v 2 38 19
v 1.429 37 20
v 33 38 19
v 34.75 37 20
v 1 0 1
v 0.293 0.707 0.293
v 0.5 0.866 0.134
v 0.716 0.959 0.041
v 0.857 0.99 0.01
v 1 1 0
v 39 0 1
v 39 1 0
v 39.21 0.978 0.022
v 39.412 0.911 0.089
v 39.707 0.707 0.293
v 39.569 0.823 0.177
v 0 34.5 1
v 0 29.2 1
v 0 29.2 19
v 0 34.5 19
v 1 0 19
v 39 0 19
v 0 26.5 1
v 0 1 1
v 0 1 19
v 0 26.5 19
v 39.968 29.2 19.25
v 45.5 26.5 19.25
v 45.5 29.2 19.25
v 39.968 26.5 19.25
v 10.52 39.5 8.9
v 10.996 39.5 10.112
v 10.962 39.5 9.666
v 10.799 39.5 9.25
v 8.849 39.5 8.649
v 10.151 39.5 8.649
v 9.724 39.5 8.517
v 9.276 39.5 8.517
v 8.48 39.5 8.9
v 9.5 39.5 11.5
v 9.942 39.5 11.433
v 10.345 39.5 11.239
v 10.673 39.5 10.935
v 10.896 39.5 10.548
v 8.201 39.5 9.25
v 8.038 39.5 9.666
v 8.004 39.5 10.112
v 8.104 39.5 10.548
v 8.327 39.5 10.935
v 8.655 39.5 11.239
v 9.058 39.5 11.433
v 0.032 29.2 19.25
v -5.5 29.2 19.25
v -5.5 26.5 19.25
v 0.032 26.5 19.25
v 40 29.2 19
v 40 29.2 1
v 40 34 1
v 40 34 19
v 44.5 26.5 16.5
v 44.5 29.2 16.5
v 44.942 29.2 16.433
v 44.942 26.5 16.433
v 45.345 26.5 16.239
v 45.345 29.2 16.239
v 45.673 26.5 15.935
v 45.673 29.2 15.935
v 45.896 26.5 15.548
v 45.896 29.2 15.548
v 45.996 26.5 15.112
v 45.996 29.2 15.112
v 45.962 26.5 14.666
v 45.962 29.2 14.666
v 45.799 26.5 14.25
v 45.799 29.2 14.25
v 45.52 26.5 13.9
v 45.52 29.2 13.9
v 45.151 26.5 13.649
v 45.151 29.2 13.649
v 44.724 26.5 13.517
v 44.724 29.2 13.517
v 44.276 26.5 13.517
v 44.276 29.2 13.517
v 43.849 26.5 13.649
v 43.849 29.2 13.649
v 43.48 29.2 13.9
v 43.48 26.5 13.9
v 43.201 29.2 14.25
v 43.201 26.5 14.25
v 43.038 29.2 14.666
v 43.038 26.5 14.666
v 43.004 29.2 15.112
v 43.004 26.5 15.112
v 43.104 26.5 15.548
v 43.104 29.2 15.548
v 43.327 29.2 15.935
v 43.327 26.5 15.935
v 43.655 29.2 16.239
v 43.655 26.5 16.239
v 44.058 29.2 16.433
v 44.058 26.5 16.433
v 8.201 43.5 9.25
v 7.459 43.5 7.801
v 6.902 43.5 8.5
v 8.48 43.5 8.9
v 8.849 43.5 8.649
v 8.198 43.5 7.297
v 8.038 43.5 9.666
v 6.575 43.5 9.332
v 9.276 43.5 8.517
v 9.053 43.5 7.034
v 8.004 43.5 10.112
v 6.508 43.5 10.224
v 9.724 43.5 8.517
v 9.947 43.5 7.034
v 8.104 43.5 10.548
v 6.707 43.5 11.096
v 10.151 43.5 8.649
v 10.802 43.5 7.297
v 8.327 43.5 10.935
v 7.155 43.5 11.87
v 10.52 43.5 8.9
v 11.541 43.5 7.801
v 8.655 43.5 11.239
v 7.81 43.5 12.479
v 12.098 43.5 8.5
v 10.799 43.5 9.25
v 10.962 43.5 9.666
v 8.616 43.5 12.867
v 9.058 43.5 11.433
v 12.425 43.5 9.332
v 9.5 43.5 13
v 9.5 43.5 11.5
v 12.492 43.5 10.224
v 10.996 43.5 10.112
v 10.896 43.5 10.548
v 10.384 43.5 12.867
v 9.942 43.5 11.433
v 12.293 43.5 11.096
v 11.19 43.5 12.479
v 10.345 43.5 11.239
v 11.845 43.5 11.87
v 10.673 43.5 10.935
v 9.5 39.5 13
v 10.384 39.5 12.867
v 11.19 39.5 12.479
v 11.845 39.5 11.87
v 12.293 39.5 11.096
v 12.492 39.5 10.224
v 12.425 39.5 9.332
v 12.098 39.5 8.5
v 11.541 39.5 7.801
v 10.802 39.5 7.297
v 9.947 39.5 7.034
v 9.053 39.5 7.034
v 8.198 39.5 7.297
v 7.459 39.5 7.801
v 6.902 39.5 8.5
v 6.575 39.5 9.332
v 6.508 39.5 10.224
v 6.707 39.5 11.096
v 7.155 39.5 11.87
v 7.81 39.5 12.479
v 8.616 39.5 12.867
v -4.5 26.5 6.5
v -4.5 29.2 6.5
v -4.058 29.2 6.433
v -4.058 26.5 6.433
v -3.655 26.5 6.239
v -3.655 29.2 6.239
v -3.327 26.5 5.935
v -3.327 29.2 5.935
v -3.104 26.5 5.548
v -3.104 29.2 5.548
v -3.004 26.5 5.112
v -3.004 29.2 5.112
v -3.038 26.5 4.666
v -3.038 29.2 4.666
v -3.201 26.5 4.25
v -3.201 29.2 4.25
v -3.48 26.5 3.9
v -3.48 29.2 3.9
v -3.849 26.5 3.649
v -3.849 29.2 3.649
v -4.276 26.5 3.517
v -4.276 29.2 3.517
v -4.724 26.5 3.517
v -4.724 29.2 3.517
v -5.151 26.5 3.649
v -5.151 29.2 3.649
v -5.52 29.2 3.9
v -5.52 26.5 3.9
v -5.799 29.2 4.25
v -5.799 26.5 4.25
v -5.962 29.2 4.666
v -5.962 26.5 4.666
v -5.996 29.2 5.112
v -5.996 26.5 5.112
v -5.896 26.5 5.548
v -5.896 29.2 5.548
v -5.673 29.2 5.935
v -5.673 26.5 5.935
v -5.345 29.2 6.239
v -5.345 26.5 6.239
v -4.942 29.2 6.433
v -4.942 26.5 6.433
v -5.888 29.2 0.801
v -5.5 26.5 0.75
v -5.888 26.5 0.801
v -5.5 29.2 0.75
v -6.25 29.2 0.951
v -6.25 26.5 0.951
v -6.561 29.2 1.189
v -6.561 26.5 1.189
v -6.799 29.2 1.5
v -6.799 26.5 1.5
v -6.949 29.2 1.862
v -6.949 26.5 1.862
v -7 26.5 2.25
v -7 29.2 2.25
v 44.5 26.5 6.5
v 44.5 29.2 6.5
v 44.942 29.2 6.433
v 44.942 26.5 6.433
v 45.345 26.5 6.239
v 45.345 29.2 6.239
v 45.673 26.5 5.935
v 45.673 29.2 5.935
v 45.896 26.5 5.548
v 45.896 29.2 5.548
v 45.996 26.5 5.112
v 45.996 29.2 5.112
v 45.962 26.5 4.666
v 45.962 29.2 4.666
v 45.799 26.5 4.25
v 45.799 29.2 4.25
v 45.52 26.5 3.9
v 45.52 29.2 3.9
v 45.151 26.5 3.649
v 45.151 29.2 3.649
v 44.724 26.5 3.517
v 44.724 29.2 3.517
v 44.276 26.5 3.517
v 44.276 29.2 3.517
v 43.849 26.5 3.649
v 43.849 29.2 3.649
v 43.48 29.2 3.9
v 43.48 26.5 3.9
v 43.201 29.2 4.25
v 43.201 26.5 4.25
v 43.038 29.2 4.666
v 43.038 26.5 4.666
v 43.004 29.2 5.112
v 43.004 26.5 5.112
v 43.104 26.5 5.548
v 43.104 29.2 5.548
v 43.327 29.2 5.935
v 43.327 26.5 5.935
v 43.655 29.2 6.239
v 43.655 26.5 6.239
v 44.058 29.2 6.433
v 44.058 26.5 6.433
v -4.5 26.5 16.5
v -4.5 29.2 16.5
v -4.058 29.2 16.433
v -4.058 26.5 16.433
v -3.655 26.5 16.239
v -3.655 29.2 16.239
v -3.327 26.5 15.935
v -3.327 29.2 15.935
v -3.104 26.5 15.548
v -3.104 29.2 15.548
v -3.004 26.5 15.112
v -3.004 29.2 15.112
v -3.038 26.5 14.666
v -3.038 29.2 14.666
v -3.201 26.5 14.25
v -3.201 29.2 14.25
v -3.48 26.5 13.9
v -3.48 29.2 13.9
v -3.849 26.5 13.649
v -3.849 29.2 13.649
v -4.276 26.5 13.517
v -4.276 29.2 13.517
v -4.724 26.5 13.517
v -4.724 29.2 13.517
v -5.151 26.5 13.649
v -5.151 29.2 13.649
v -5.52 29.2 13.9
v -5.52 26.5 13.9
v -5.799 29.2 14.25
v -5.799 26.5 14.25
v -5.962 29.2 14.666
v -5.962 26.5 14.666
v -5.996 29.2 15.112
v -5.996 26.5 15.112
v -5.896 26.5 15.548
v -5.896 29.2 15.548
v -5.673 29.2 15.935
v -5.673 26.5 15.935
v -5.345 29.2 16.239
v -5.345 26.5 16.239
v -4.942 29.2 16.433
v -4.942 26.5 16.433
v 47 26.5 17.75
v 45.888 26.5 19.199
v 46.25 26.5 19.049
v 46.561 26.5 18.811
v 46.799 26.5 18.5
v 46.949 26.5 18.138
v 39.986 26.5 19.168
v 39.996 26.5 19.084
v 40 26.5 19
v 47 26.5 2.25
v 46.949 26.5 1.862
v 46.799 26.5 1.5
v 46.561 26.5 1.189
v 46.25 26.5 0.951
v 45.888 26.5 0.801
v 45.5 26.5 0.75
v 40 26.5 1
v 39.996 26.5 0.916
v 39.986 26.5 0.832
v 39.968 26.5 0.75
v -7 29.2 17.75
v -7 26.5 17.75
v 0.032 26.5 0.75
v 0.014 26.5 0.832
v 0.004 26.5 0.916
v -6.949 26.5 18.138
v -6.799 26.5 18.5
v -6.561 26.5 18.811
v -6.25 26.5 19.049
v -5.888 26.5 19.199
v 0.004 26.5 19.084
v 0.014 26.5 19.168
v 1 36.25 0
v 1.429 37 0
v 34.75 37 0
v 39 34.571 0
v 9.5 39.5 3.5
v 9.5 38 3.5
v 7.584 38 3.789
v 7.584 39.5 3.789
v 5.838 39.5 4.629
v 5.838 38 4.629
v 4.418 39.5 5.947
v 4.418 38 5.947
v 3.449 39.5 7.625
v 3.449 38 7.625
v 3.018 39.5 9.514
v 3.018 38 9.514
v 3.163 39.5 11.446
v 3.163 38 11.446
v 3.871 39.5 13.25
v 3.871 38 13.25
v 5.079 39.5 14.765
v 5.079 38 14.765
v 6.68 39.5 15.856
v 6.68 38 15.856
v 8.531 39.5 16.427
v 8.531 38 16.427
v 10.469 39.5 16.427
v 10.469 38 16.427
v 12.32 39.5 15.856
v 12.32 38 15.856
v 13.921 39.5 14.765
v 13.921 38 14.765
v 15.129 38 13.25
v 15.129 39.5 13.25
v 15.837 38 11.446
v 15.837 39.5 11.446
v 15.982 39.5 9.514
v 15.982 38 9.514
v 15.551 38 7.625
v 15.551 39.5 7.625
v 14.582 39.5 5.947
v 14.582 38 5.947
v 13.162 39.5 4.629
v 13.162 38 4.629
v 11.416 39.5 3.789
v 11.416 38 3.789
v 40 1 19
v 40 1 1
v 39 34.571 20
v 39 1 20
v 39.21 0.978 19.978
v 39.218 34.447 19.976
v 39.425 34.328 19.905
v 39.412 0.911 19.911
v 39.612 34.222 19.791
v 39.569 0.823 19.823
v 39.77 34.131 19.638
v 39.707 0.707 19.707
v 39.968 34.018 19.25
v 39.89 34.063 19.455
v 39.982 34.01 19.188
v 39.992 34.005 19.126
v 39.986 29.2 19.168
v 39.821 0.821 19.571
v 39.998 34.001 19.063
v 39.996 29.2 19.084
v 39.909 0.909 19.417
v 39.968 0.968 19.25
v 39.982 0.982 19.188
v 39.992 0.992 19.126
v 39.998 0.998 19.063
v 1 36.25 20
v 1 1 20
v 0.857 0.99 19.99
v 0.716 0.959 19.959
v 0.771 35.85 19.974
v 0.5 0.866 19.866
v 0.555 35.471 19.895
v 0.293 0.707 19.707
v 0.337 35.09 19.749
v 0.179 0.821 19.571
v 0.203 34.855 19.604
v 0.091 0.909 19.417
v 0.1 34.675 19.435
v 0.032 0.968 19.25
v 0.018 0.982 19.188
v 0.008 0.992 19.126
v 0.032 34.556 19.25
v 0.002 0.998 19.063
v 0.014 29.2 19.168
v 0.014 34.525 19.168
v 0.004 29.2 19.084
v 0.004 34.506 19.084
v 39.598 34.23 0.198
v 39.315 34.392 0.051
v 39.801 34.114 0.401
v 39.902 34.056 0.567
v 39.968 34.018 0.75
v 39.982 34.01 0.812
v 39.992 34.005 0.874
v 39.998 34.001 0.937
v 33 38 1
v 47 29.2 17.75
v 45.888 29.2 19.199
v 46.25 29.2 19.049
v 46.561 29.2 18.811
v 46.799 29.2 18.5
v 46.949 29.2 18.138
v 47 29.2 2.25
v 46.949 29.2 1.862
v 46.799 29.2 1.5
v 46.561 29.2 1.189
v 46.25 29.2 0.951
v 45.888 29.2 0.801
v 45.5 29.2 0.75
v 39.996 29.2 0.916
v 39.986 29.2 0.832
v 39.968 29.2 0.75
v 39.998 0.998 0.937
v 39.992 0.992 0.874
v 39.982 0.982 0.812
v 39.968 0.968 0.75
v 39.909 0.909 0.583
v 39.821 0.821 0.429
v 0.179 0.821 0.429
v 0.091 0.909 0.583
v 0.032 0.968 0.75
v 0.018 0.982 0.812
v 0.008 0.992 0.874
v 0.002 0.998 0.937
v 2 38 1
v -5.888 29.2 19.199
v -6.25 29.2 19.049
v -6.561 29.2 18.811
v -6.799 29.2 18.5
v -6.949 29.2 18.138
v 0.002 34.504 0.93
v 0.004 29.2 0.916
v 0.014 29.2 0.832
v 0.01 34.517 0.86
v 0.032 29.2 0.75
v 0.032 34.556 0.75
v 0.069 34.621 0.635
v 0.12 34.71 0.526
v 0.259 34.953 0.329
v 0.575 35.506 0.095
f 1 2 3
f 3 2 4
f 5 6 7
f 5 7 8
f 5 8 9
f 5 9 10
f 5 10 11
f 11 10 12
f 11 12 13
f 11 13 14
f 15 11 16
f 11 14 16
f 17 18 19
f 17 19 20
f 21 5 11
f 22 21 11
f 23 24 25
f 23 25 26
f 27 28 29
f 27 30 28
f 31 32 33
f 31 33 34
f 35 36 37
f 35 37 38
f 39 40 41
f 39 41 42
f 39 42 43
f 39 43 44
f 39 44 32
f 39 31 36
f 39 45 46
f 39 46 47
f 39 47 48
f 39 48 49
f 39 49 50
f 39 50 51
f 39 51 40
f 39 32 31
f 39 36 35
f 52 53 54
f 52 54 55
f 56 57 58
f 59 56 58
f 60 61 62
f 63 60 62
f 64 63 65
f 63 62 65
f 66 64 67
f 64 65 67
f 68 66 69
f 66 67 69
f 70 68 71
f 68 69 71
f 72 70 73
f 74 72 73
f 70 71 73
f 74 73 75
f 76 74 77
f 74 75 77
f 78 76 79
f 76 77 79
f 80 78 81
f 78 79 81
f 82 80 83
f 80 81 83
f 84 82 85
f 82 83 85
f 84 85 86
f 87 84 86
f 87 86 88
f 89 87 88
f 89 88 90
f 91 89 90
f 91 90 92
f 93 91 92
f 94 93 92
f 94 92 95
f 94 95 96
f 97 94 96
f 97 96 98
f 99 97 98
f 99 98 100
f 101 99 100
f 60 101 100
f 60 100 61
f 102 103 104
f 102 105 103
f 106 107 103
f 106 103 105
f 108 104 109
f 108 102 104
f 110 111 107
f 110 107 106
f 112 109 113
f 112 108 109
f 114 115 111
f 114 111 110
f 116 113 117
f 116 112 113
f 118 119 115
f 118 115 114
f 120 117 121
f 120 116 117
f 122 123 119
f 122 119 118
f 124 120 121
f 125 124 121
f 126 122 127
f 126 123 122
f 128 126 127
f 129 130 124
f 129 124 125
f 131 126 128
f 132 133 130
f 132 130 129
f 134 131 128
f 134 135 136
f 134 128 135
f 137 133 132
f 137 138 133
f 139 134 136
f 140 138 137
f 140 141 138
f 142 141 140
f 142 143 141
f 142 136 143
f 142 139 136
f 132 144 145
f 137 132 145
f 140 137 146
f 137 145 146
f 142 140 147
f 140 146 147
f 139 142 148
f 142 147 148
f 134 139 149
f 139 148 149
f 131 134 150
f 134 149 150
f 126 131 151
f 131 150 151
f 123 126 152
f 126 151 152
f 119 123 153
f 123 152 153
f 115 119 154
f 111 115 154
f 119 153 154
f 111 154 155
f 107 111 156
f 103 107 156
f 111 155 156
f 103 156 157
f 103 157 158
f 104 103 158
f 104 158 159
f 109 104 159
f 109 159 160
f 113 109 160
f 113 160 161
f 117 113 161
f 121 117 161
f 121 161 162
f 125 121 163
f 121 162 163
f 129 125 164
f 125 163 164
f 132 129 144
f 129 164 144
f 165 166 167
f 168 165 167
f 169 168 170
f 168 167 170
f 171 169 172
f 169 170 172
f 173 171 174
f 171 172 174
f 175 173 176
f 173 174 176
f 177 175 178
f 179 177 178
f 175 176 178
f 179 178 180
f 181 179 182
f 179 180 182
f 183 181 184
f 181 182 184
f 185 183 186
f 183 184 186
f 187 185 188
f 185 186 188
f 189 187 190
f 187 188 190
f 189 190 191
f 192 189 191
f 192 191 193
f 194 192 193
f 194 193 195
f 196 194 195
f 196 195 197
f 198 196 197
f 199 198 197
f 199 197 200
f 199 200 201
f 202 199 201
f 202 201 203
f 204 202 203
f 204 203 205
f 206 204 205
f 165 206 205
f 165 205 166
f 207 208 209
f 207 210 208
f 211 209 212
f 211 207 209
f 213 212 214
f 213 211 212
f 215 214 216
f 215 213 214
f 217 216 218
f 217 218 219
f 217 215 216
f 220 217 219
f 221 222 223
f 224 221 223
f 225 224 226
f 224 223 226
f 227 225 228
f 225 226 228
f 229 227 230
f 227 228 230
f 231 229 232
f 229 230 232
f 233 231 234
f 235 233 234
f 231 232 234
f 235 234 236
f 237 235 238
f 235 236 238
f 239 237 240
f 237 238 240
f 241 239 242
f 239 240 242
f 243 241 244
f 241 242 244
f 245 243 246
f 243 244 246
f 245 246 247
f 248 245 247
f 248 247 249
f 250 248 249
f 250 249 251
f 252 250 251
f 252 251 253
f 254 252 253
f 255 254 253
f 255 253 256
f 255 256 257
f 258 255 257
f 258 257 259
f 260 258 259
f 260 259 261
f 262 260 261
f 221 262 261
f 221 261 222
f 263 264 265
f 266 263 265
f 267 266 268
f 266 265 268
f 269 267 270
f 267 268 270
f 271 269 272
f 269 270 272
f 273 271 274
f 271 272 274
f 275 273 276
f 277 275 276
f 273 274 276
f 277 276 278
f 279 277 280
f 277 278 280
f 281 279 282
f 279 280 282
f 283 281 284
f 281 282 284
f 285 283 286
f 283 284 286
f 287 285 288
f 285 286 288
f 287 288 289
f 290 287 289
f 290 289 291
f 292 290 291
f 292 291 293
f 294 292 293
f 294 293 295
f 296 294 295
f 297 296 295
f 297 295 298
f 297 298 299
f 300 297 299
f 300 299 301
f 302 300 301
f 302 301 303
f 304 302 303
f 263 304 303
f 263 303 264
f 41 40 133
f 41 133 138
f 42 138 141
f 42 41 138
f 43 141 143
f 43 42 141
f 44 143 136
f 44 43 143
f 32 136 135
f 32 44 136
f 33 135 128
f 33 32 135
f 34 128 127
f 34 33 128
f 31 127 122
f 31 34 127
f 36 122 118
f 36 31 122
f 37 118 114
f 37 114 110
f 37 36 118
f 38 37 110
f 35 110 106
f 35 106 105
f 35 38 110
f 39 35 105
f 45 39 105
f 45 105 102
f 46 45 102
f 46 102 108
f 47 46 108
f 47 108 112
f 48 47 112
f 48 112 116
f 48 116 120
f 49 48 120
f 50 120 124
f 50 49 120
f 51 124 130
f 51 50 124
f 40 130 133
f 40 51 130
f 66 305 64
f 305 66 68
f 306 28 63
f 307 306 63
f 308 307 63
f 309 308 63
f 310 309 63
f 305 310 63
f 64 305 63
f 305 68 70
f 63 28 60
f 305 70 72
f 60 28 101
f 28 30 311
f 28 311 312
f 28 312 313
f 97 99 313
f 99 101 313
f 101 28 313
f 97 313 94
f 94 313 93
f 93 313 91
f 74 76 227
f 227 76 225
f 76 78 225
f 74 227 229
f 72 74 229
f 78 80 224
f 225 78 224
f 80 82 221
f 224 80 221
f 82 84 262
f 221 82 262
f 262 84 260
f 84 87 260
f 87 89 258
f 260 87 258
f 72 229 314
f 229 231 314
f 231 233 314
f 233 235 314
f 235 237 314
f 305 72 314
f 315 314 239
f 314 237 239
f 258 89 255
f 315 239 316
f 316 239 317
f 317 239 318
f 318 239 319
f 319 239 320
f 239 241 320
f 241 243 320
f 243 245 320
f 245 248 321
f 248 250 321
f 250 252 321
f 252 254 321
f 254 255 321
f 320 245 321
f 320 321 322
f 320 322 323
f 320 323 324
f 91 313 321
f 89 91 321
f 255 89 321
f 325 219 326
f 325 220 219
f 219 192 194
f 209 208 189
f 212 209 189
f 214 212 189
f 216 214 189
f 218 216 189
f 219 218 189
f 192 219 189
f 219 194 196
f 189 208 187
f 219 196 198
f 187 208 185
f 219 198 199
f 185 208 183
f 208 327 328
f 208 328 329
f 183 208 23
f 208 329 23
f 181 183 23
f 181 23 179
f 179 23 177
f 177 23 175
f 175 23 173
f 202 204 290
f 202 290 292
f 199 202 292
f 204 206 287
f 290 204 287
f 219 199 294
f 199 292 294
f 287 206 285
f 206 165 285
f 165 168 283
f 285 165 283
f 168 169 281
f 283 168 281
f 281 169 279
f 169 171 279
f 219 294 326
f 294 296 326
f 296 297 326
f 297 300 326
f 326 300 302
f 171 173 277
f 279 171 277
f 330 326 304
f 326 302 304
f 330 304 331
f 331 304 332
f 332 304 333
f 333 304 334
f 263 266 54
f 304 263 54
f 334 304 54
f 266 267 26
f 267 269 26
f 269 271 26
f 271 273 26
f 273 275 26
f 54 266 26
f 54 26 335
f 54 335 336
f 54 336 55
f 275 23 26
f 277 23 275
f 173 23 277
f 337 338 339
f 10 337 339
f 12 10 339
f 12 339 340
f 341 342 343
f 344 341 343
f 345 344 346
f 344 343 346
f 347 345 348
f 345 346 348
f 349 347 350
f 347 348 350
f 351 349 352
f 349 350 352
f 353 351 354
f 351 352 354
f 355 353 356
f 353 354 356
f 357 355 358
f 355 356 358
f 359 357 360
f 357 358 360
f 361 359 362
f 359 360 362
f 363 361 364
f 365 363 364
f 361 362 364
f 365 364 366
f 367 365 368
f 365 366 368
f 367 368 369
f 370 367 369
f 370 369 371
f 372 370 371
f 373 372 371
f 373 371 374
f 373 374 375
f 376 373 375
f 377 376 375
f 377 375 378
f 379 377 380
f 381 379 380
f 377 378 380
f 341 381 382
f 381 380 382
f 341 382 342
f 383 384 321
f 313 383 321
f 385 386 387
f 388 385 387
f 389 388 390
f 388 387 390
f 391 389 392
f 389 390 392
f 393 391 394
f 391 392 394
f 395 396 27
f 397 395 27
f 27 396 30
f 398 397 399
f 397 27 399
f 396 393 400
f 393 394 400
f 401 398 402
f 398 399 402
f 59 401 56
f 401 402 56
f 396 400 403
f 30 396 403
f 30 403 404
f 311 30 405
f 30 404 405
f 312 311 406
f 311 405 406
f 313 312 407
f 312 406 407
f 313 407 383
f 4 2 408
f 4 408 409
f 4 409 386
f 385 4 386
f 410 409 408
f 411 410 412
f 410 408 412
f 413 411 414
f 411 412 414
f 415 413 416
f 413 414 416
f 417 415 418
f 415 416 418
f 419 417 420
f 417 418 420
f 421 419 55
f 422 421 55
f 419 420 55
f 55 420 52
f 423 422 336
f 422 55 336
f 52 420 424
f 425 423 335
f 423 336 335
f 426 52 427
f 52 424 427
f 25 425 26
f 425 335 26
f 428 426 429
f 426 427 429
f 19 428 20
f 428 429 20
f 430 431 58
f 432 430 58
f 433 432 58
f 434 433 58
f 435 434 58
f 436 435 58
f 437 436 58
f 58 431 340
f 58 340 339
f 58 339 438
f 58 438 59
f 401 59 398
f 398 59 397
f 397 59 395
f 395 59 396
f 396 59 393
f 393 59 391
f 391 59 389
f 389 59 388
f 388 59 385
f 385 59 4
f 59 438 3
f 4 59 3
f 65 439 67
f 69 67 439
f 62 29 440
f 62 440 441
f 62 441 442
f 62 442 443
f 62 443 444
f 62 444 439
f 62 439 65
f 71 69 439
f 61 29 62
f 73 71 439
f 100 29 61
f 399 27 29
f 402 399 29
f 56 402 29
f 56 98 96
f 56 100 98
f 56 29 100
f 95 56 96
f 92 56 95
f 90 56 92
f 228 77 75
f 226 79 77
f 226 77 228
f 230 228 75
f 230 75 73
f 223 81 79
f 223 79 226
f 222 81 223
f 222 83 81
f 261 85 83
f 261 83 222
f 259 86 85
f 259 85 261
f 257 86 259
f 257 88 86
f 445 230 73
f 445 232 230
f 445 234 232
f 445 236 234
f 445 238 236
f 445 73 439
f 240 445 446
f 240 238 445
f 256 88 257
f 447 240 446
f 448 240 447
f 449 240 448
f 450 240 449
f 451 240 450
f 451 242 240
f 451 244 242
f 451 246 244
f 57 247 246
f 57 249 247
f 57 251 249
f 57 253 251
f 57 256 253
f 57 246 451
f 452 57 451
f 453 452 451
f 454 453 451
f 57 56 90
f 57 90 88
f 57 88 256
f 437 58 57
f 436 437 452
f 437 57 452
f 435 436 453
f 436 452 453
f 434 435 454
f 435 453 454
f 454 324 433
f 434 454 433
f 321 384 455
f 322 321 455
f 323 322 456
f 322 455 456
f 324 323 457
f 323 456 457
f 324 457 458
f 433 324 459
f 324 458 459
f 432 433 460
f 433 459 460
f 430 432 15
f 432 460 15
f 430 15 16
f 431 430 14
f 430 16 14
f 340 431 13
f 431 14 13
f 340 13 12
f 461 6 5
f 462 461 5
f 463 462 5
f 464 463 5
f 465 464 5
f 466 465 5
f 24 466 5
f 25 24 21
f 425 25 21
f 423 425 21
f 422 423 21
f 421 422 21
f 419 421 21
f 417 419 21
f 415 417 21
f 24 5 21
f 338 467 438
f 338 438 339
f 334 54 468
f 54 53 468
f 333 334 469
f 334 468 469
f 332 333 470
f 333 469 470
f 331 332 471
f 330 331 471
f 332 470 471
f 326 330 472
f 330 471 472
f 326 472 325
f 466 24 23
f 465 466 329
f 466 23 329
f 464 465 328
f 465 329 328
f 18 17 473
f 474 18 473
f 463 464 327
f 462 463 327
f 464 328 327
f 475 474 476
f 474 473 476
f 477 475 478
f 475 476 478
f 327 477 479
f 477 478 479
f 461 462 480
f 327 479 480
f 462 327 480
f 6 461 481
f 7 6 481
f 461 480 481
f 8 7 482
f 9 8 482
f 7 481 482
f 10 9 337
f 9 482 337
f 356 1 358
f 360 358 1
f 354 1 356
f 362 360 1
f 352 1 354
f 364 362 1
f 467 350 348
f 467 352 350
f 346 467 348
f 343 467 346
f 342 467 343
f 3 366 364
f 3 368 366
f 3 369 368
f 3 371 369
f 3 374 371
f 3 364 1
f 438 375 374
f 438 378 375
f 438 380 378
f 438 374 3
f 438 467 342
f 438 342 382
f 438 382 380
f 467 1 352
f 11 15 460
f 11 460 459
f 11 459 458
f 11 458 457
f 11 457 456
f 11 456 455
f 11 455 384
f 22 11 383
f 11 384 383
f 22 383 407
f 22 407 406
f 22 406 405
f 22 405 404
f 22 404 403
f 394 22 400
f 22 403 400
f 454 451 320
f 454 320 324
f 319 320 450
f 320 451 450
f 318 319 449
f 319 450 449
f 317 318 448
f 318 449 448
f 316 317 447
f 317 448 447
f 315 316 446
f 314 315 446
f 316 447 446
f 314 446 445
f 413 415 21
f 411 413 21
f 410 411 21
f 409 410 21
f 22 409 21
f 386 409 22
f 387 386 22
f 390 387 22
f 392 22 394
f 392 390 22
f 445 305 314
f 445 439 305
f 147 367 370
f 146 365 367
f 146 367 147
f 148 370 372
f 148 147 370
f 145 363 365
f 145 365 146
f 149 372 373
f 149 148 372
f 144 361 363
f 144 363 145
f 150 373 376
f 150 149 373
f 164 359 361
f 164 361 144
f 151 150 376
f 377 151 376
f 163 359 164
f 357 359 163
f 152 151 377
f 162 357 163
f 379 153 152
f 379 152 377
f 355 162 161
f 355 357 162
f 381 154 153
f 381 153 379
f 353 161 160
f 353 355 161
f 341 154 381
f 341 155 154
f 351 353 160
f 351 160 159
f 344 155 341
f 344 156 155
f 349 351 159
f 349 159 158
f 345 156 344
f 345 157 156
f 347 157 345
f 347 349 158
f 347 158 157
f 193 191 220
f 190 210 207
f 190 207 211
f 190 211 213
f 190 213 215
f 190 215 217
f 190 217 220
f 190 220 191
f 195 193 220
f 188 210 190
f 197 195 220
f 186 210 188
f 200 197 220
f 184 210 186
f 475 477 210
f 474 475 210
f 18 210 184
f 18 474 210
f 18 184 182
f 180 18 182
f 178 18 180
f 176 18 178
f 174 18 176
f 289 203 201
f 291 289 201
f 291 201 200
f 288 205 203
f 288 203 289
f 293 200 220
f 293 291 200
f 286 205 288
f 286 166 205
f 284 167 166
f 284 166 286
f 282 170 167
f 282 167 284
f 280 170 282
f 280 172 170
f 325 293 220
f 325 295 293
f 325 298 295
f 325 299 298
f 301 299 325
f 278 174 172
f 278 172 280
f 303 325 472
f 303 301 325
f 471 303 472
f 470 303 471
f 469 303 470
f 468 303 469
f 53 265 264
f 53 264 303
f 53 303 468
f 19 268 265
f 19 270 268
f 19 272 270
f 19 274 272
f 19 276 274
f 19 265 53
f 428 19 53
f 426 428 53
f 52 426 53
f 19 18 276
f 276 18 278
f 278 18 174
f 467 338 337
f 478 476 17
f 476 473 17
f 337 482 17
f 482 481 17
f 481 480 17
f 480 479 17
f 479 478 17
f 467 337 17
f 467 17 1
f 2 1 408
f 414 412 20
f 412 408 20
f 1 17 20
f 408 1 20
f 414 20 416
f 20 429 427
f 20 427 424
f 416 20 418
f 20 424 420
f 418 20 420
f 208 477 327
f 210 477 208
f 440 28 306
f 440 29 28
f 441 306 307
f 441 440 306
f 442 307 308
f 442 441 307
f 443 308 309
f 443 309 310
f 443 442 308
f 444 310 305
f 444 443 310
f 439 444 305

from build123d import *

# Parameters (mm, degrees)
SKETCH_1_W          = 40
SKETCH_1_H          = 38
EXTRUDE_1_DEPTH     = 20
SKETCH_2_W          = 18.5
SKETCH_2_H          = 2.7
EXTRUDE_2_DEPTH     = 7
SKETCH_3_W          = 18.5
SKETCH_3_H          = 2.7
EXTRUDE_3_DEPTH     = 7
SKETCH_4_R          = 1.5
CUT_EXTRUDE_1_DEPTH = 7
CHAMFER_1_SIZE      = 1
CHAMFER_2_SIZE      = 2
CHAMFER_2_SIZE2     = 3.5
CHAMFER_3_SIZE      = 4
CHAMFER_3_SIZE2     = 7
CHAMFER_4_SIZE      = 1
SKETCH_5_R          = 6.5
EXTRUDE_4_DEPTH     = 1.5
SKETCH_6_R          = 3
SKETCH_6_R_2        = 1.5
EXTRUDE_5_DEPTH     = 4
FILLET_1_R          = 1.5
FILLET_2_R          = 1


with BuildPart() as part:
    # 草图1 → 凸台-拉伸1 (new body)
    with BuildSketch(Plane.XY):
        with Locations((20, 19)):
            Rectangle(SKETCH_1_W, SKETCH_1_H)
    extrude(amount=EXTRUDE_1_DEPTH)

    # 草图2 → 凸台-拉伸2 (add)
    with BuildSketch(Plane.ZY):
        with Locations((10, 27.85)):
            Rectangle(SKETCH_2_W, SKETCH_2_H)
    extrude(amount=EXTRUDE_2_DEPTH)

    # 草图3 → 凸台-拉伸3 (add)
    with BuildSketch(Plane(origin=(40, 0, 0), x_dir=(0, 0, -1), z_dir=(1, 0, 0))):
        with Locations((-10, 27.85)):
            Rectangle(SKETCH_3_W, SKETCH_3_H)
    extrude(amount=EXTRUDE_3_DEPTH)

    # 草图4 → 切除-拉伸1 (cut)
    with BuildSketch(Plane(origin=(0, 29.2, 0), x_dir=(1, 0, 0), z_dir=(0, 1, 0))):
        with Locations(Location((-4.5, -5, 0), (0, 0, 270))):
            Circle(SKETCH_4_R)
        with Locations(Location((44.5, -5, 0), (0, 0, 270))):
            Circle(SKETCH_4_R)
        with Locations(Location((-4.5, -15, 0), (0, 0, 270))):
            Circle(SKETCH_4_R)
        with Locations(Location((44.5, -15, 0), (0, 0, 270))):
            Circle(SKETCH_4_R)
    extrude(amount=-CUT_EXTRUDE_1_DEPTH, mode=Mode.SUBTRACT)

    # 倒角1
    chamfer_1_edges = [part.edges().sort_by_distance(p)[0] for p in [
        (20, 0, 0),
        (40, 0, 10),
        (0, 0, 10),
        (20, 0, 20),
    ]]
    chamfer(chamfer_1_edges, length=CHAMFER_1_SIZE)

    # 倒角2
    chamfer_2_edges = [part.edges().sort_by_distance(p)[0] for p in [
        (0, 38, 10),
    ]]
    chamfer_2_side = [part.faces().sort_by_distance(p)[0] for p in [
        (20, 38, 10),
    ]]
    chamfer(chamfer_2_edges, length=CHAMFER_2_SIZE, length2=CHAMFER_2_SIZE2, reference=chamfer_2_side[0])

    # 倒角3
    chamfer_3_edges = [part.edges().sort_by_distance(p)[0] for p in [
        (40, 38, 10),
    ]]
    chamfer_3_side = [part.faces().sort_by_distance(p)[0] for p in [
        (40, 18.895576408, 10),
    ]]
    chamfer(chamfer_3_edges, length=CHAMFER_3_SIZE, length2=CHAMFER_3_SIZE2, reference=chamfer_3_side[0])

    # 倒角4
    chamfer_4_edges = [part.edges().sort_by_distance(p)[0] for p in [
        (17.5, 38, 0),
        (17.5, 38, 20),
    ]]
    chamfer(chamfer_4_edges, length=CHAMFER_4_SIZE)

    # 草图5 → 凸台-拉伸4 (add)
    with BuildSketch(Plane(origin=(0, 38, 0), x_dir=(1, 0, 0), z_dir=(0, 1, 0))):
        with Locations(Location((9.5, -10, 0), (0, 0, 90))):
            Circle(SKETCH_5_R)
    extrude(amount=EXTRUDE_4_DEPTH)

    # 草图6 → 凸台-拉伸5 (add)
    with BuildSketch(Plane(origin=(0, 39.5, 0), x_dir=(1, 0, 0), z_dir=(0, 1, 0))):
        with Locations(Location((9.5, -10, 0), (0, 0, 270))):
            Circle(SKETCH_6_R)
        with Locations(Location((9.5, -10, 0), (0, 0, 270))):
            Circle(SKETCH_6_R_2, mode=Mode.SUBTRACT)
    extrude(amount=EXTRUDE_5_DEPTH)

    # 圆角1
    fillet_1_edges = [part.edges().sort_by_distance(p)[0] for p in [
        (-7, 27.85, 0.75),
        (-7, 27.85, 19.25),
        (47, 27.85, 19.25),
        (47, 27.85, 0.75),
    ]]
    fillet(fillet_1_edges, radius=FILLET_1_R)

    # 圆角2
    # the kernel refuses this fillet: 1 mm, written as the material it takes off along each edge
    with BuildSketch(Plane(origin=(0, 37, 20), x_dir=(1, 0, 0), z_dir=(0, -1, 0))) as fillet_2_piece_1_section:
        with BuildLine():
            CenterArc((FILLET_2_R, -FILLET_2_R), FILLET_2_R, 90, 90)
            Line((0, -FILLET_2_R), (0, 0))
            Line((0, 0), (FILLET_2_R, 0))
        make_face()
    fillet_2_piece_1 = extrude(amount=38.5, mode=Mode.PRIVATE)
    fillet_2_piece_1 = split(fillet_2_piece_1, bisect_by=Plane(origin=(0.233478453, 29.2, 19.792941909), z_dir=(0, 1, 0)), keep=Keep.TOP, mode=Mode.PRIVATE)
    fillet_2_piece_1 = split(fillet_2_piece_1, bisect_by=Plane(origin=(0.233478453, 33.1, 19.25), z_dir=(0, 0, 1)), keep=Keep.TOP, mode=Mode.PRIVATE)
    add(fillet_2_piece_1, mode=Mode.SUBTRACT)
    with BuildSketch(Plane(origin=(0, 37, 20), x_dir=(1, 0, 0), z_dir=(0, -1, 0))) as fillet_2_piece_2_section:
        with BuildLine():
            CenterArc((FILLET_2_R, -FILLET_2_R), FILLET_2_R, 90, 90)
            Line((0, -FILLET_2_R), (0, 0))
            Line((0, 0), (FILLET_2_R, 0))
        make_face()
    fillet_2_piece_2 = extrude(amount=38.5, mode=Mode.PRIVATE)
    fillet_2_piece_2 = split(fillet_2_piece_2, bisect_by=Plane(origin=(-0.003280029, 29.2, 19.146607635), z_dir=(0, 1, 0)), keep=Keep.TOP, mode=Mode.PRIVATE)
    fillet_2_piece_2 = split(fillet_2_piece_2, bisect_by=Plane(origin=(-0.003280029, 33.1, 19.25), z_dir=(0, 0, -1)), keep=Keep.TOP, mode=Mode.PRIVATE)
    add(fillet_2_piece_2, mode=Mode.SUBTRACT)
    with BuildSketch(Plane(origin=(0, 37, 20), x_dir=(1, 0, 0), z_dir=(0, -1, 0))) as fillet_2_piece_3_section:
        with BuildLine():
            CenterArc((FILLET_2_R, -FILLET_2_R), FILLET_2_R, 90, 90)
            Line((0, -FILLET_2_R), (0, 0))
            Line((0, 0), (FILLET_2_R, 0))
        make_face()
    fillet_2_piece_3 = extrude(amount=38.5, mode=Mode.PRIVATE)
    fillet_2_piece_3 = split(fillet_2_piece_3, bisect_by=Plane(origin=(0.233478453, 29.2, 19.792941909), z_dir=(0, -1, 0)), keep=Keep.TOP, mode=Mode.PRIVATE)
    fillet_2_piece_3 = split(fillet_2_piece_3, bisect_by=Plane(origin=(0.233478453, 27.85, 19.25), z_dir=(0, 0, 1)), keep=Keep.TOP, mode=Mode.PRIVATE)
    fillet_2_piece_3 = split(fillet_2_piece_3, bisect_by=Plane(origin=(0.233478453, 26.5, 19.792941909), z_dir=(0, 1, 0)), keep=Keep.TOP, mode=Mode.PRIVATE)
    add(fillet_2_piece_3, mode=Mode.SUBTRACT)
    with BuildSketch(Plane(origin=(0, 37, 20), x_dir=(1, 0, 0), z_dir=(0, -1, 0))) as fillet_2_piece_4_section:
        with BuildLine():
            CenterArc((FILLET_2_R, -FILLET_2_R), FILLET_2_R, 90, 90)
            Line((0, -FILLET_2_R), (0, 0))
            Line((0, 0), (FILLET_2_R, 0))
        make_face()
    fillet_2_piece_4 = extrude(amount=38.5, mode=Mode.PRIVATE)
    fillet_2_piece_4 = split(fillet_2_piece_4, bisect_by=Plane(origin=(0.233478453, 12.5, 19.25), z_dir=(0, 0, 1)), keep=Keep.TOP, mode=Mode.PRIVATE)
    fillet_2_piece_4 = split(fillet_2_piece_4, bisect_by=Plane(origin=(0.233478453, 26.5, 19.792941909), z_dir=(0, -1, 0)), keep=Keep.TOP, mode=Mode.PRIVATE)
    add(fillet_2_piece_4, mode=Mode.SUBTRACT)
    with BuildSketch(Plane(origin=(0, 37, 20), x_dir=(1, 0, 0), z_dir=(0, -1, 0))) as fillet_2_piece_5_section:
        with BuildLine():
            CenterArc((FILLET_2_R, -FILLET_2_R), FILLET_2_R, 90, 90)
            Line((0, -FILLET_2_R), (0, 0))
            Line((0, 0), (FILLET_2_R, 0))
        make_face()
    fillet_2_piece_5 = extrude(amount=38.5, mode=Mode.PRIVATE)
    fillet_2_piece_5 = split(fillet_2_piece_5, bisect_by=Plane(origin=(-0.003280029, 12.5, 19.25), z_dir=(0, 0, -1)), keep=Keep.TOP, mode=Mode.PRIVATE)
    fillet_2_piece_5 = split(fillet_2_piece_5, bisect_by=Plane(origin=(-0.003280029, 26.5, 19.146607635), z_dir=(0, -1, 0)), keep=Keep.TOP, mode=Mode.PRIVATE)
    add(fillet_2_piece_5, mode=Mode.SUBTRACT)
    with BuildSketch(Plane(origin=(0, 37, 0), x_dir=(1, 0, 0), z_dir=(0, -1, 0))) as fillet_2_piece_6_section:
        with BuildLine():
            CenterArc((FILLET_2_R, FILLET_2_R), FILLET_2_R, 180, 90)
            Line((0, FILLET_2_R), (0, 0))
            Line((0, 0), (FILLET_2_R, 0))
        make_face()
    fillet_2_piece_6 = extrude(amount=38.5, mode=Mode.PRIVATE)
    fillet_2_piece_6 = split(fillet_2_piece_6, bisect_by=Plane(origin=(0.233478453, 29.2, 0.207058091), z_dir=(0, 1, 0)), keep=Keep.TOP, mode=Mode.PRIVATE)
    fillet_2_piece_6 = split(fillet_2_piece_6, bisect_by=Plane(origin=(0.233478453, 33.1, 0.75), z_dir=(0, 0, -1)), keep=Keep.TOP, mode=Mode.PRIVATE)
    add(fillet_2_piece_6, mode=Mode.SUBTRACT)
    with BuildSketch(Plane(origin=(0, 37, 0), x_dir=(1, 0, 0), z_dir=(0, -1, 0))) as fillet_2_piece_7_section:
        with BuildLine():
            CenterArc((FILLET_2_R, FILLET_2_R), FILLET_2_R, 180, 90)
            Line((0, FILLET_2_R), (0, 0))
            Line((0, 0), (FILLET_2_R, 0))
        make_face()
    fillet_2_piece_7 = extrude(amount=38.5, mode=Mode.PRIVATE)
    fillet_2_piece_7 = split(fillet_2_piece_7, bisect_by=Plane(origin=(-0.003280029, 29.2, 0.853392365), z_dir=(0, 1, 0)), keep=Keep.TOP, mode=Mode.PRIVATE)
    fillet_2_piece_7 = split(fillet_2_piece_7, bisect_by=Plane(origin=(-0.003280029, 33.1, 0.75), z_dir=(0, 0, 1)), keep=Keep.TOP, mode=Mode.PRIVATE)
    add(fillet_2_piece_7, mode=Mode.SUBTRACT)
    with BuildSketch(Plane(origin=(0, 37, 0), x_dir=(1, 0, 0), z_dir=(0, -1, 0))) as fillet_2_piece_8_section:
        with BuildLine():
            CenterArc((FILLET_2_R, FILLET_2_R), FILLET_2_R, 180, 90)
            Line((0, FILLET_2_R), (0, 0))
            Line((0, 0), (FILLET_2_R, 0))
        make_face()
    fillet_2_piece_8 = extrude(amount=38.5, mode=Mode.PRIVATE)
    fillet_2_piece_8 = split(fillet_2_piece_8, bisect_by=Plane(origin=(0.233478453, 29.2, 0.207058091), z_dir=(0, -1, 0)), keep=Keep.TOP, mode=Mode.PRIVATE)
    fillet_2_piece_8 = split(fillet_2_piece_8, bisect_by=Plane(origin=(0.233478453, 26.5, 0.207058091), z_dir=(0, 1, 0)), keep=Keep.TOP, mode=Mode.PRIVATE)
    fillet_2_piece_8 = split(fillet_2_piece_8, bisect_by=Plane(origin=(0.233478453, 27.85, 0.75), z_dir=(0, 0, -1)), keep=Keep.TOP, mode=Mode.PRIVATE)
    add(fillet_2_piece_8, mode=Mode.SUBTRACT)
    with BuildSketch(Plane(origin=(0, 37, 0), x_dir=(1, 0, 0), z_dir=(0, -1, 0))) as fillet_2_piece_9_section:
        with BuildLine():
            CenterArc((FILLET_2_R, FILLET_2_R), FILLET_2_R, 180, 90)
            Line((0, FILLET_2_R), (0, 0))
            Line((0, 0), (FILLET_2_R, 0))
        make_face()
    fillet_2_piece_9 = extrude(amount=38.5, mode=Mode.PRIVATE)
    fillet_2_piece_9 = split(fillet_2_piece_9, bisect_by=Plane(origin=(0.233478453, 26.5, 0.207058091), z_dir=(0, -1, 0)), keep=Keep.TOP, mode=Mode.PRIVATE)
    fillet_2_piece_9 = split(fillet_2_piece_9, bisect_by=Plane(origin=(0.233478453, 12.5, 0.75), z_dir=(0, 0, -1)), keep=Keep.TOP, mode=Mode.PRIVATE)
    add(fillet_2_piece_9, mode=Mode.SUBTRACT)
    with BuildSketch(Plane(origin=(0, 37, 0), x_dir=(1, 0, 0), z_dir=(0, -1, 0))) as fillet_2_piece_10_section:
        with BuildLine():
            CenterArc((FILLET_2_R, FILLET_2_R), FILLET_2_R, 180, 90)
            Line((0, FILLET_2_R), (0, 0))
            Line((0, 0), (FILLET_2_R, 0))
        make_face()
    fillet_2_piece_10 = extrude(amount=38.5, mode=Mode.PRIVATE)
    fillet_2_piece_10 = split(fillet_2_piece_10, bisect_by=Plane(origin=(-0.003280029, 26.5, 0.853392365), z_dir=(0, -1, 0)), keep=Keep.TOP, mode=Mode.PRIVATE)
    fillet_2_piece_10 = split(fillet_2_piece_10, bisect_by=Plane(origin=(-0.003280029, 12.5, 0.75), z_dir=(0, 0, 1)), keep=Keep.TOP, mode=Mode.PRIVATE)
    add(fillet_2_piece_10, mode=Mode.SUBTRACT)
    with BuildSketch(Plane(origin=(40, -1.5, 0), x_dir=(0, 0, 1), z_dir=(0, 1, 0))) as fillet_2_piece_11_section:
        with BuildLine():
            CenterArc((FILLET_2_R, -FILLET_2_R), FILLET_2_R, 90, 90)
            Line((0, -FILLET_2_R), (0, 0))
            Line((0, 0), (FILLET_2_R, 0))
        make_face()
    fillet_2_piece_11 = extrude(amount=38, mode=Mode.PRIVATE)
    fillet_2_piece_11 = split(fillet_2_piece_11, bisect_by=Plane(origin=(40.003280029, 26.5, 0.853392365), z_dir=(0, -1, 0)), keep=Keep.TOP, mode=Mode.PRIVATE)
    fillet_2_piece_11 = split(fillet_2_piece_11, bisect_by=Plane(origin=(40.003280029, 12.5, 0.75), z_dir=(0, 0, 1)), keep=Keep.TOP, mode=Mode.PRIVATE)
    add(fillet_2_piece_11, mode=Mode.SUBTRACT)
    with BuildSketch(Plane(origin=(40, -1.5, 0), x_dir=(0, 0, 1), z_dir=(0, 1, 0))) as fillet_2_piece_12_section:
        with BuildLine():
            CenterArc((FILLET_2_R, -FILLET_2_R), FILLET_2_R, 90, 90)
            Line((0, -FILLET_2_R), (0, 0))
            Line((0, 0), (FILLET_2_R, 0))
        make_face()
    fillet_2_piece_12 = extrude(amount=38, mode=Mode.PRIVATE)
    fillet_2_piece_12 = split(fillet_2_piece_12, bisect_by=Plane(origin=(39.766521547, 26.5, 0.207058091), z_dir=(0, -1, 0)), keep=Keep.TOP, mode=Mode.PRIVATE)
    fillet_2_piece_12 = split(fillet_2_piece_12, bisect_by=Plane(origin=(39.766521547, 12.5, 0.75), z_dir=(0, 0, -1)), keep=Keep.TOP, mode=Mode.PRIVATE)
    add(fillet_2_piece_12, mode=Mode.SUBTRACT)
    with BuildSketch(Plane(origin=(40, -1.5, 0), x_dir=(0, 0, 1), z_dir=(0, 1, 0))) as fillet_2_piece_13_section:
        with BuildLine():
            CenterArc((FILLET_2_R, -FILLET_2_R), FILLET_2_R, 90, 90)
            Line((0, -FILLET_2_R), (0, 0))
            Line((0, 0), (FILLET_2_R, 0))
        make_face()
    fillet_2_piece_13 = extrude(amount=38, mode=Mode.PRIVATE)
    fillet_2_piece_13 = split(fillet_2_piece_13, bisect_by=Plane(origin=(39.766521547, 26.5, 0.207058091), z_dir=(0, 1, 0)), keep=Keep.TOP, mode=Mode.PRIVATE)
    fillet_2_piece_13 = split(fillet_2_piece_13, bisect_by=Plane(origin=(39.766521547, 29.2, 0.207058091), z_dir=(0, -1, 0)), keep=Keep.TOP, mode=Mode.PRIVATE)
    fillet_2_piece_13 = split(fillet_2_piece_13, bisect_by=Plane(origin=(39.766521547, 27.85, 0.75), z_dir=(0, 0, -1)), keep=Keep.TOP, mode=Mode.PRIVATE)
    add(fillet_2_piece_13, mode=Mode.SUBTRACT)
    with BuildSketch(Plane(origin=(40, -1.5, 0), x_dir=(0, 0, 1), z_dir=(0, 1, 0))) as fillet_2_piece_14_section:
        with BuildLine():
            CenterArc((FILLET_2_R, -FILLET_2_R), FILLET_2_R, 90, 90)
            Line((0, -FILLET_2_R), (0, 0))
            Line((0, 0), (FILLET_2_R, 0))
        make_face()
    fillet_2_piece_14 = extrude(amount=38, mode=Mode.PRIVATE)
    fillet_2_piece_14 = split(fillet_2_piece_14, bisect_by=Plane(origin=(40.003280029, 29.2, 0.853392365), z_dir=(0, 1, 0)), keep=Keep.TOP, mode=Mode.PRIVATE)
    fillet_2_piece_14 = split(fillet_2_piece_14, bisect_by=Plane(origin=(40.003280029, 32.85, 0.75), z_dir=(0, 0, 1)), keep=Keep.TOP, mode=Mode.PRIVATE)
    add(fillet_2_piece_14, mode=Mode.SUBTRACT)
    with BuildSketch(Plane(origin=(40, -1.5, 0), x_dir=(0, 0, 1), z_dir=(0, 1, 0))) as fillet_2_piece_15_section:
        with BuildLine():
            CenterArc((FILLET_2_R, -FILLET_2_R), FILLET_2_R, 90, 90)
            Line((0, -FILLET_2_R), (0, 0))
            Line((0, 0), (FILLET_2_R, 0))
        make_face()
    fillet_2_piece_15 = extrude(amount=38, mode=Mode.PRIVATE)
    fillet_2_piece_15 = split(fillet_2_piece_15, bisect_by=Plane(origin=(39.766521547, 29.2, 0.207058091), z_dir=(0, 1, 0)), keep=Keep.TOP, mode=Mode.PRIVATE)
    fillet_2_piece_15 = split(fillet_2_piece_15, bisect_by=Plane(origin=(39.766521547, 32.85, 0.75), z_dir=(0, 0, -1)), keep=Keep.TOP, mode=Mode.PRIVATE)
    add(fillet_2_piece_15, mode=Mode.SUBTRACT)
    with BuildSketch(Plane(origin=(40, -1.5, 20), x_dir=(0, 0, -1), z_dir=(0, 1, 0))) as fillet_2_piece_16_section:
        with BuildLine():
            CenterArc((FILLET_2_R, FILLET_2_R), FILLET_2_R, 180, 90)
            Line((0, FILLET_2_R), (0, 0))
            Line((0, 0), (FILLET_2_R, 0))
        make_face()
    fillet_2_piece_16 = extrude(amount=38, mode=Mode.PRIVATE)
    fillet_2_piece_16 = split(fillet_2_piece_16, bisect_by=Plane(origin=(40.003280029, 26.5, 19.146607635), z_dir=(0, -1, 0)), keep=Keep.TOP, mode=Mode.PRIVATE)
    fillet_2_piece_16 = split(fillet_2_piece_16, bisect_by=Plane(origin=(40.003280029, 12.5, 19.25), z_dir=(0, 0, -1)), keep=Keep.TOP, mode=Mode.PRIVATE)
    add(fillet_2_piece_16, mode=Mode.SUBTRACT)
    with BuildSketch(Plane(origin=(40, -1.5, 20), x_dir=(0, 0, -1), z_dir=(0, 1, 0))) as fillet_2_piece_17_section:
        with BuildLine():
            CenterArc((FILLET_2_R, FILLET_2_R), FILLET_2_R, 180, 90)
            Line((0, FILLET_2_R), (0, 0))
            Line((0, 0), (FILLET_2_R, 0))
        make_face()
    fillet_2_piece_17 = extrude(amount=38, mode=Mode.PRIVATE)
    fillet_2_piece_17 = split(fillet_2_piece_17, bisect_by=Plane(origin=(39.766521547, 26.5, 19.792941909), z_dir=(0, -1, 0)), keep=Keep.TOP, mode=Mode.PRIVATE)
    fillet_2_piece_17 = split(fillet_2_piece_17, bisect_by=Plane(origin=(39.766521547, 12.5, 19.25), z_dir=(0, 0, 1)), keep=Keep.TOP, mode=Mode.PRIVATE)
    add(fillet_2_piece_17, mode=Mode.SUBTRACT)
    with BuildSketch(Plane(origin=(40, -1.5, 20), x_dir=(0, 0, -1), z_dir=(0, 1, 0))) as fillet_2_piece_18_section:
        with BuildLine():
            CenterArc((FILLET_2_R, FILLET_2_R), FILLET_2_R, 180, 90)
            Line((0, FILLET_2_R), (0, 0))
            Line((0, 0), (FILLET_2_R, 0))
        make_face()
    fillet_2_piece_18 = extrude(amount=38, mode=Mode.PRIVATE)
    fillet_2_piece_18 = split(fillet_2_piece_18, bisect_by=Plane(origin=(39.766521547, 26.5, 19.792941909), z_dir=(0, 1, 0)), keep=Keep.TOP, mode=Mode.PRIVATE)
    fillet_2_piece_18 = split(fillet_2_piece_18, bisect_by=Plane(origin=(39.766521547, 27.85, 19.25), z_dir=(0, 0, 1)), keep=Keep.TOP, mode=Mode.PRIVATE)
    fillet_2_piece_18 = split(fillet_2_piece_18, bisect_by=Plane(origin=(39.766521547, 29.2, 19.792941909), z_dir=(0, -1, 0)), keep=Keep.TOP, mode=Mode.PRIVATE)
    add(fillet_2_piece_18, mode=Mode.SUBTRACT)
    with BuildSketch(Plane(origin=(40, -1.5, 20), x_dir=(0, 0, -1), z_dir=(0, 1, 0))) as fillet_2_piece_19_section:
        with BuildLine():
            CenterArc((FILLET_2_R, FILLET_2_R), FILLET_2_R, 180, 90)
            Line((0, FILLET_2_R), (0, 0))
            Line((0, 0), (FILLET_2_R, 0))
        make_face()
    fillet_2_piece_19 = extrude(amount=38, mode=Mode.PRIVATE)
    fillet_2_piece_19 = split(fillet_2_piece_19, bisect_by=Plane(origin=(40.003280029, 32.85, 19.25), z_dir=(0, 0, -1)), keep=Keep.TOP, mode=Mode.PRIVATE)
    fillet_2_piece_19 = split(fillet_2_piece_19, bisect_by=Plane(origin=(40.003280029, 29.2, 19.146607635), z_dir=(0, 1, 0)), keep=Keep.TOP, mode=Mode.PRIVATE)
    add(fillet_2_piece_19, mode=Mode.SUBTRACT)
    with BuildSketch(Plane(origin=(40, -1.5, 20), x_dir=(0, 0, -1), z_dir=(0, 1, 0))) as fillet_2_piece_20_section:
        with BuildLine():
            CenterArc((FILLET_2_R, FILLET_2_R), FILLET_2_R, 180, 90)
            Line((0, FILLET_2_R), (0, 0))
            Line((0, 0), (FILLET_2_R, 0))
        make_face()
    fillet_2_piece_20 = extrude(amount=38, mode=Mode.PRIVATE)
    fillet_2_piece_20 = split(fillet_2_piece_20, bisect_by=Plane(origin=(39.766521547, 32.85, 19.25), z_dir=(0, 0, 1)), keep=Keep.TOP, mode=Mode.PRIVATE)
    fillet_2_piece_20 = split(fillet_2_piece_20, bisect_by=Plane(origin=(39.766521547, 29.2, 19.792941909), z_dir=(0, 1, 0)), keep=Keep.TOP, mode=Mode.PRIVATE)
    add(fillet_2_piece_20, mode=Mode.SUBTRACT)


solid = part.part
